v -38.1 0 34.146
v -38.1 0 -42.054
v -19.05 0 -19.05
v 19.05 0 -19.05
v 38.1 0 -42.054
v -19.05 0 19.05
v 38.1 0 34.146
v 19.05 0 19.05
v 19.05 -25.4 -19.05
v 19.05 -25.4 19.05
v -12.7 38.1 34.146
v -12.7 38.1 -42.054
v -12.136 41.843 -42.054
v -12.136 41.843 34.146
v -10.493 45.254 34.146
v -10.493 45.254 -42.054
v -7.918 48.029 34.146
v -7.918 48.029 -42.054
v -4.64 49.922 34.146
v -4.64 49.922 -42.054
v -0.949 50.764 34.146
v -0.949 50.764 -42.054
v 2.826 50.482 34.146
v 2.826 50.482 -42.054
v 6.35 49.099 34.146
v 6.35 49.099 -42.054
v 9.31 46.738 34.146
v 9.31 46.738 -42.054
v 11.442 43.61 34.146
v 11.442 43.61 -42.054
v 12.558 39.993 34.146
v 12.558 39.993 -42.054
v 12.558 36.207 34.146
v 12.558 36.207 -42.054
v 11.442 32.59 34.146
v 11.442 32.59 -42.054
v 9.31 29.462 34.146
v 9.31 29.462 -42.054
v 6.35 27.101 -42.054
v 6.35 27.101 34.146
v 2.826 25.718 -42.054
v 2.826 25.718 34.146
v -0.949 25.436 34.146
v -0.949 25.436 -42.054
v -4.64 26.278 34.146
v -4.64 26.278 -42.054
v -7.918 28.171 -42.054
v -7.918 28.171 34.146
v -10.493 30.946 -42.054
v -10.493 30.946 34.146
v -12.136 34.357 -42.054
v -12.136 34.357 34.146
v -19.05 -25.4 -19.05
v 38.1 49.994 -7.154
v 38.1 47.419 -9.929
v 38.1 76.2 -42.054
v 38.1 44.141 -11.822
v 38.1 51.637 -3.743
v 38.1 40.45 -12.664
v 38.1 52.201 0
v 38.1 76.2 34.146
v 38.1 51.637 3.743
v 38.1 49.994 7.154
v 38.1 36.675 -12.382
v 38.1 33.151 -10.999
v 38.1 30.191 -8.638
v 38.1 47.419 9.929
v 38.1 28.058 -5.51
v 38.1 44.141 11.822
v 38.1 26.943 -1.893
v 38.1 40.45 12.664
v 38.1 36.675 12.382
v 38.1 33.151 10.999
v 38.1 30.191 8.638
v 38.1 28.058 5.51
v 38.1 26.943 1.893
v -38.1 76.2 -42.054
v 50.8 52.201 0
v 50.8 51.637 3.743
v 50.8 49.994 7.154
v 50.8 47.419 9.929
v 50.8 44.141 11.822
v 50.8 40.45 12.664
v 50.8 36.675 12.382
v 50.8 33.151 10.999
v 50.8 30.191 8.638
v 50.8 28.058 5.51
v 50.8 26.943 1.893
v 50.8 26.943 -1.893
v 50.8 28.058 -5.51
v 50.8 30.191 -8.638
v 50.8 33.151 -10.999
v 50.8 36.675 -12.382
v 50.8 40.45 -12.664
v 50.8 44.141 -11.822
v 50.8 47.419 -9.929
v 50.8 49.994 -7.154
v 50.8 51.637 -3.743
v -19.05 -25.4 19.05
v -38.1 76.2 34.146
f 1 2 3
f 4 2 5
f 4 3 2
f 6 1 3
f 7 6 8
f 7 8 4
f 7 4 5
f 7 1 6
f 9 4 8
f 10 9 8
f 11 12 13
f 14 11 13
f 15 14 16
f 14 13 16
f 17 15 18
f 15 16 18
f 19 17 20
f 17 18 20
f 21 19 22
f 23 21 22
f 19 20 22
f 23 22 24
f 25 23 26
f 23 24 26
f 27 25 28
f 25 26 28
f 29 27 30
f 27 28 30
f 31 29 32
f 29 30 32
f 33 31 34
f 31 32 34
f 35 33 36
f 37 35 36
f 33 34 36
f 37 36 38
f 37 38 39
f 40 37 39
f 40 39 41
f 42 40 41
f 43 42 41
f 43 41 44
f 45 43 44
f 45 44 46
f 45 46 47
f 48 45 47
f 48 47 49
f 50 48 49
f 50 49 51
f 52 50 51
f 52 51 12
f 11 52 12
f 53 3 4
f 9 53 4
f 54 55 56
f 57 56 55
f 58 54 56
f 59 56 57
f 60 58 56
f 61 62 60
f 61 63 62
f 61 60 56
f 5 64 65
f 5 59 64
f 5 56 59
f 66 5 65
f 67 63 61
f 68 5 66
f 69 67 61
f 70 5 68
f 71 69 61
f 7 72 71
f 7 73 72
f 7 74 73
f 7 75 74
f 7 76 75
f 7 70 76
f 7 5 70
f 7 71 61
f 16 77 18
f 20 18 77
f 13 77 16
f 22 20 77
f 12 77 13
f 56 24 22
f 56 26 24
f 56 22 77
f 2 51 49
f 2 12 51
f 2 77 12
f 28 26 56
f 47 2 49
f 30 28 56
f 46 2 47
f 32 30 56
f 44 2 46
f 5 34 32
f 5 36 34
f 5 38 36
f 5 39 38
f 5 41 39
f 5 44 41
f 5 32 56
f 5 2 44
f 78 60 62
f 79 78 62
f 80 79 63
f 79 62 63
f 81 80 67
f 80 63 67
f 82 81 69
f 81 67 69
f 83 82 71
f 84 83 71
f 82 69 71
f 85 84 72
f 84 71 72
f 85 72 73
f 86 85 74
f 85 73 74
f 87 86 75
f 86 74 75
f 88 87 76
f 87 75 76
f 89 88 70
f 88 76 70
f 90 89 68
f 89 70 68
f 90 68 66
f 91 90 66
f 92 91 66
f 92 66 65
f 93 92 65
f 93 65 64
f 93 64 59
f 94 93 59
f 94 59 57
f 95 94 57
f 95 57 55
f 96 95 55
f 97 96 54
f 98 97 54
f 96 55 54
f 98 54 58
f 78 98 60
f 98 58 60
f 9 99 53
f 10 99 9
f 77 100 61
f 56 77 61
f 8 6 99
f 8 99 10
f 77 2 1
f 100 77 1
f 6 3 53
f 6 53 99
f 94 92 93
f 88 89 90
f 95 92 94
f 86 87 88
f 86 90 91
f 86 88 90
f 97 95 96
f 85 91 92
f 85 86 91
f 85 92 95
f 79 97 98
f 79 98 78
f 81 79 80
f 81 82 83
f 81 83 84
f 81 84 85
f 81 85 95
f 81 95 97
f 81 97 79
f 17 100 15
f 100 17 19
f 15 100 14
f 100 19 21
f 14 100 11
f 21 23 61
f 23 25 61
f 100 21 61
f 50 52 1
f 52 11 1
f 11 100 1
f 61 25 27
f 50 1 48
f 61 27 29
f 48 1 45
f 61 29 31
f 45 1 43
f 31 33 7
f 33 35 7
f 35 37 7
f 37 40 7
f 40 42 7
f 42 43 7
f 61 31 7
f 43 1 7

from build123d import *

# Parameters (mm, degrees)
F0_W     = 76.2
F0_H     = 76.2
F1_DEPTH = 76.2
F3_D     = 25.4
F4_W     = 38.1
F4_H     = 38.1
F5_DEPTH = 25.4
F6_R     = 12.7
F7_DEPTH = 12.7


with BuildPart() as f1:
    # F0 (on Front) → F1 (new body)
    with BuildSketch(Plane.XZ):
        with Locations((0, -3.953981)):
            Rectangle(F0_W, F0_H)
    extrude(amount=-F1_DEPTH)

    # F3 (through all)
    with Locations(Plane.XY.offset(34.146019)):
        with Locations((0, 38.1)):
            Hole(F3_D / 2)

    # F4 (on face) → F5 (join)
    with BuildSketch(Plane.XZ):
        Rectangle(F4_W, F4_H)
    extrude(amount=F5_DEPTH)

    # F6 (on face) → F7 (join)
    with BuildSketch(Plane.YZ.offset(38.1)):
        with Locations((39.500758, 0)):
            Circle(F6_R)
    extrude(amount=F7_DEPTH)


solid = f1.part
